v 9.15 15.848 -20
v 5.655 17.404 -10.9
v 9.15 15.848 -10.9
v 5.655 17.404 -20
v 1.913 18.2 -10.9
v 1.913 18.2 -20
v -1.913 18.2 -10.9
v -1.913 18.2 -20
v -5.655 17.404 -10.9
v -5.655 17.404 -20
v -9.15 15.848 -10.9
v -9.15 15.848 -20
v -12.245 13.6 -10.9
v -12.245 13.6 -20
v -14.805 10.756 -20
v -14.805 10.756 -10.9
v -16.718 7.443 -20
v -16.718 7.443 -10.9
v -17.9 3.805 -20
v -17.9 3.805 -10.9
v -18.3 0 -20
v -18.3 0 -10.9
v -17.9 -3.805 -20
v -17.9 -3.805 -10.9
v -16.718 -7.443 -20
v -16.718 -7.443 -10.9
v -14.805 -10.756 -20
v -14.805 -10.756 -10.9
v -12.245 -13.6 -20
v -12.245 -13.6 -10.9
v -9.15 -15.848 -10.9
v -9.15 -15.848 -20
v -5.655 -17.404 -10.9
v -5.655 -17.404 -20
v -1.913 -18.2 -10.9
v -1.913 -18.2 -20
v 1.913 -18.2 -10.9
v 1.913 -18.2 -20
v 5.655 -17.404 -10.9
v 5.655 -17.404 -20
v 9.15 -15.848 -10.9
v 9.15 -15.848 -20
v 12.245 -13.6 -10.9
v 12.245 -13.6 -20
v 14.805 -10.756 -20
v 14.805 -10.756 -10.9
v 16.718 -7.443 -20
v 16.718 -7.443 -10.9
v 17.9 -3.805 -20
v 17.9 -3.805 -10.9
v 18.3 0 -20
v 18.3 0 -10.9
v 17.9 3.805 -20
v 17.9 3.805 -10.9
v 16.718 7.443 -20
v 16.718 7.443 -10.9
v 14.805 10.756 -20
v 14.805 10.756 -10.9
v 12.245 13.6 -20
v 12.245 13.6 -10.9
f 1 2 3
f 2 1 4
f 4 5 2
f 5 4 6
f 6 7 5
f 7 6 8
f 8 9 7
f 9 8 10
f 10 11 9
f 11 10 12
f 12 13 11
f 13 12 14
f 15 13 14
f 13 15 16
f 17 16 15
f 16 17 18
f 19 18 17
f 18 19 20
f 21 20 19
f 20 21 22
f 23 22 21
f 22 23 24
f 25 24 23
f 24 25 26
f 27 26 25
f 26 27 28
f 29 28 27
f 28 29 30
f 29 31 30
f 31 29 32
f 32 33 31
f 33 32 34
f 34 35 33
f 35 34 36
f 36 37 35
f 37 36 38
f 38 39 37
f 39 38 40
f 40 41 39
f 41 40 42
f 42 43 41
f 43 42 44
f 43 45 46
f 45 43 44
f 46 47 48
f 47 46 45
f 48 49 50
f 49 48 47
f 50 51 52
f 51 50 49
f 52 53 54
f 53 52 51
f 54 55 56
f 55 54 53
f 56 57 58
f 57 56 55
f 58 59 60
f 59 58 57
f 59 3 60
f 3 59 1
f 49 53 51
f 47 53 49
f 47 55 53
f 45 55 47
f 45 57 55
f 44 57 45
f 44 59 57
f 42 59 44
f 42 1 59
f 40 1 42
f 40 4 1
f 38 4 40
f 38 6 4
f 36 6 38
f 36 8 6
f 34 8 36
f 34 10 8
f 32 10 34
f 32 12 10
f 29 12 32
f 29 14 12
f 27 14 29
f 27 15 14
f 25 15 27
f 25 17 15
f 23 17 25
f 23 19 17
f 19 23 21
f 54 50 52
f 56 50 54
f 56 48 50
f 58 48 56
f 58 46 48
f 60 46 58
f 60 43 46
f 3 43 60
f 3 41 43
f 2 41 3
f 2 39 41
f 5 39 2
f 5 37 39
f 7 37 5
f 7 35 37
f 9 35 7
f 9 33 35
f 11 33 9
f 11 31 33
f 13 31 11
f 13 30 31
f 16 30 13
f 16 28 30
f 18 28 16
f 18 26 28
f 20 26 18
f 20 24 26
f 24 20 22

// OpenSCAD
//////////////////////////////////////////////
//  ***TeMoG - Tentacle Mold Generator***   //
//  by Jonas Jørgensen (jonj@sdu.dk) 2020   //
//                                          //
//  Shared under a Creative Commons         //
//  Attribution-ShareAlike (CC BY-SA 3.0)   //
//  license                                 //
//////////////////////////////////////////////

//Part 3a - Top Piece - solid disk version

$fn=30; //Set to 200 when generating the molds for 3D printing

//Main cone and mold
minDiam = 35; //Cone

//Bottom
straightHeightBottom = 20;
bottomThickness=4;
LDRHolderThickness= 10-0.5;
LDRHolderDiam= minDiam+3-1;
delta=0.4; //Inaccuracy of printer (layering and overextrusion)

rotate (60) translate ([0,0,-straightHeightBottom]) cylinder(LDRHolderThickness-delta,d2=LDRHolderDiam-delta,d1=LDRHolderDiam-delta);
    
